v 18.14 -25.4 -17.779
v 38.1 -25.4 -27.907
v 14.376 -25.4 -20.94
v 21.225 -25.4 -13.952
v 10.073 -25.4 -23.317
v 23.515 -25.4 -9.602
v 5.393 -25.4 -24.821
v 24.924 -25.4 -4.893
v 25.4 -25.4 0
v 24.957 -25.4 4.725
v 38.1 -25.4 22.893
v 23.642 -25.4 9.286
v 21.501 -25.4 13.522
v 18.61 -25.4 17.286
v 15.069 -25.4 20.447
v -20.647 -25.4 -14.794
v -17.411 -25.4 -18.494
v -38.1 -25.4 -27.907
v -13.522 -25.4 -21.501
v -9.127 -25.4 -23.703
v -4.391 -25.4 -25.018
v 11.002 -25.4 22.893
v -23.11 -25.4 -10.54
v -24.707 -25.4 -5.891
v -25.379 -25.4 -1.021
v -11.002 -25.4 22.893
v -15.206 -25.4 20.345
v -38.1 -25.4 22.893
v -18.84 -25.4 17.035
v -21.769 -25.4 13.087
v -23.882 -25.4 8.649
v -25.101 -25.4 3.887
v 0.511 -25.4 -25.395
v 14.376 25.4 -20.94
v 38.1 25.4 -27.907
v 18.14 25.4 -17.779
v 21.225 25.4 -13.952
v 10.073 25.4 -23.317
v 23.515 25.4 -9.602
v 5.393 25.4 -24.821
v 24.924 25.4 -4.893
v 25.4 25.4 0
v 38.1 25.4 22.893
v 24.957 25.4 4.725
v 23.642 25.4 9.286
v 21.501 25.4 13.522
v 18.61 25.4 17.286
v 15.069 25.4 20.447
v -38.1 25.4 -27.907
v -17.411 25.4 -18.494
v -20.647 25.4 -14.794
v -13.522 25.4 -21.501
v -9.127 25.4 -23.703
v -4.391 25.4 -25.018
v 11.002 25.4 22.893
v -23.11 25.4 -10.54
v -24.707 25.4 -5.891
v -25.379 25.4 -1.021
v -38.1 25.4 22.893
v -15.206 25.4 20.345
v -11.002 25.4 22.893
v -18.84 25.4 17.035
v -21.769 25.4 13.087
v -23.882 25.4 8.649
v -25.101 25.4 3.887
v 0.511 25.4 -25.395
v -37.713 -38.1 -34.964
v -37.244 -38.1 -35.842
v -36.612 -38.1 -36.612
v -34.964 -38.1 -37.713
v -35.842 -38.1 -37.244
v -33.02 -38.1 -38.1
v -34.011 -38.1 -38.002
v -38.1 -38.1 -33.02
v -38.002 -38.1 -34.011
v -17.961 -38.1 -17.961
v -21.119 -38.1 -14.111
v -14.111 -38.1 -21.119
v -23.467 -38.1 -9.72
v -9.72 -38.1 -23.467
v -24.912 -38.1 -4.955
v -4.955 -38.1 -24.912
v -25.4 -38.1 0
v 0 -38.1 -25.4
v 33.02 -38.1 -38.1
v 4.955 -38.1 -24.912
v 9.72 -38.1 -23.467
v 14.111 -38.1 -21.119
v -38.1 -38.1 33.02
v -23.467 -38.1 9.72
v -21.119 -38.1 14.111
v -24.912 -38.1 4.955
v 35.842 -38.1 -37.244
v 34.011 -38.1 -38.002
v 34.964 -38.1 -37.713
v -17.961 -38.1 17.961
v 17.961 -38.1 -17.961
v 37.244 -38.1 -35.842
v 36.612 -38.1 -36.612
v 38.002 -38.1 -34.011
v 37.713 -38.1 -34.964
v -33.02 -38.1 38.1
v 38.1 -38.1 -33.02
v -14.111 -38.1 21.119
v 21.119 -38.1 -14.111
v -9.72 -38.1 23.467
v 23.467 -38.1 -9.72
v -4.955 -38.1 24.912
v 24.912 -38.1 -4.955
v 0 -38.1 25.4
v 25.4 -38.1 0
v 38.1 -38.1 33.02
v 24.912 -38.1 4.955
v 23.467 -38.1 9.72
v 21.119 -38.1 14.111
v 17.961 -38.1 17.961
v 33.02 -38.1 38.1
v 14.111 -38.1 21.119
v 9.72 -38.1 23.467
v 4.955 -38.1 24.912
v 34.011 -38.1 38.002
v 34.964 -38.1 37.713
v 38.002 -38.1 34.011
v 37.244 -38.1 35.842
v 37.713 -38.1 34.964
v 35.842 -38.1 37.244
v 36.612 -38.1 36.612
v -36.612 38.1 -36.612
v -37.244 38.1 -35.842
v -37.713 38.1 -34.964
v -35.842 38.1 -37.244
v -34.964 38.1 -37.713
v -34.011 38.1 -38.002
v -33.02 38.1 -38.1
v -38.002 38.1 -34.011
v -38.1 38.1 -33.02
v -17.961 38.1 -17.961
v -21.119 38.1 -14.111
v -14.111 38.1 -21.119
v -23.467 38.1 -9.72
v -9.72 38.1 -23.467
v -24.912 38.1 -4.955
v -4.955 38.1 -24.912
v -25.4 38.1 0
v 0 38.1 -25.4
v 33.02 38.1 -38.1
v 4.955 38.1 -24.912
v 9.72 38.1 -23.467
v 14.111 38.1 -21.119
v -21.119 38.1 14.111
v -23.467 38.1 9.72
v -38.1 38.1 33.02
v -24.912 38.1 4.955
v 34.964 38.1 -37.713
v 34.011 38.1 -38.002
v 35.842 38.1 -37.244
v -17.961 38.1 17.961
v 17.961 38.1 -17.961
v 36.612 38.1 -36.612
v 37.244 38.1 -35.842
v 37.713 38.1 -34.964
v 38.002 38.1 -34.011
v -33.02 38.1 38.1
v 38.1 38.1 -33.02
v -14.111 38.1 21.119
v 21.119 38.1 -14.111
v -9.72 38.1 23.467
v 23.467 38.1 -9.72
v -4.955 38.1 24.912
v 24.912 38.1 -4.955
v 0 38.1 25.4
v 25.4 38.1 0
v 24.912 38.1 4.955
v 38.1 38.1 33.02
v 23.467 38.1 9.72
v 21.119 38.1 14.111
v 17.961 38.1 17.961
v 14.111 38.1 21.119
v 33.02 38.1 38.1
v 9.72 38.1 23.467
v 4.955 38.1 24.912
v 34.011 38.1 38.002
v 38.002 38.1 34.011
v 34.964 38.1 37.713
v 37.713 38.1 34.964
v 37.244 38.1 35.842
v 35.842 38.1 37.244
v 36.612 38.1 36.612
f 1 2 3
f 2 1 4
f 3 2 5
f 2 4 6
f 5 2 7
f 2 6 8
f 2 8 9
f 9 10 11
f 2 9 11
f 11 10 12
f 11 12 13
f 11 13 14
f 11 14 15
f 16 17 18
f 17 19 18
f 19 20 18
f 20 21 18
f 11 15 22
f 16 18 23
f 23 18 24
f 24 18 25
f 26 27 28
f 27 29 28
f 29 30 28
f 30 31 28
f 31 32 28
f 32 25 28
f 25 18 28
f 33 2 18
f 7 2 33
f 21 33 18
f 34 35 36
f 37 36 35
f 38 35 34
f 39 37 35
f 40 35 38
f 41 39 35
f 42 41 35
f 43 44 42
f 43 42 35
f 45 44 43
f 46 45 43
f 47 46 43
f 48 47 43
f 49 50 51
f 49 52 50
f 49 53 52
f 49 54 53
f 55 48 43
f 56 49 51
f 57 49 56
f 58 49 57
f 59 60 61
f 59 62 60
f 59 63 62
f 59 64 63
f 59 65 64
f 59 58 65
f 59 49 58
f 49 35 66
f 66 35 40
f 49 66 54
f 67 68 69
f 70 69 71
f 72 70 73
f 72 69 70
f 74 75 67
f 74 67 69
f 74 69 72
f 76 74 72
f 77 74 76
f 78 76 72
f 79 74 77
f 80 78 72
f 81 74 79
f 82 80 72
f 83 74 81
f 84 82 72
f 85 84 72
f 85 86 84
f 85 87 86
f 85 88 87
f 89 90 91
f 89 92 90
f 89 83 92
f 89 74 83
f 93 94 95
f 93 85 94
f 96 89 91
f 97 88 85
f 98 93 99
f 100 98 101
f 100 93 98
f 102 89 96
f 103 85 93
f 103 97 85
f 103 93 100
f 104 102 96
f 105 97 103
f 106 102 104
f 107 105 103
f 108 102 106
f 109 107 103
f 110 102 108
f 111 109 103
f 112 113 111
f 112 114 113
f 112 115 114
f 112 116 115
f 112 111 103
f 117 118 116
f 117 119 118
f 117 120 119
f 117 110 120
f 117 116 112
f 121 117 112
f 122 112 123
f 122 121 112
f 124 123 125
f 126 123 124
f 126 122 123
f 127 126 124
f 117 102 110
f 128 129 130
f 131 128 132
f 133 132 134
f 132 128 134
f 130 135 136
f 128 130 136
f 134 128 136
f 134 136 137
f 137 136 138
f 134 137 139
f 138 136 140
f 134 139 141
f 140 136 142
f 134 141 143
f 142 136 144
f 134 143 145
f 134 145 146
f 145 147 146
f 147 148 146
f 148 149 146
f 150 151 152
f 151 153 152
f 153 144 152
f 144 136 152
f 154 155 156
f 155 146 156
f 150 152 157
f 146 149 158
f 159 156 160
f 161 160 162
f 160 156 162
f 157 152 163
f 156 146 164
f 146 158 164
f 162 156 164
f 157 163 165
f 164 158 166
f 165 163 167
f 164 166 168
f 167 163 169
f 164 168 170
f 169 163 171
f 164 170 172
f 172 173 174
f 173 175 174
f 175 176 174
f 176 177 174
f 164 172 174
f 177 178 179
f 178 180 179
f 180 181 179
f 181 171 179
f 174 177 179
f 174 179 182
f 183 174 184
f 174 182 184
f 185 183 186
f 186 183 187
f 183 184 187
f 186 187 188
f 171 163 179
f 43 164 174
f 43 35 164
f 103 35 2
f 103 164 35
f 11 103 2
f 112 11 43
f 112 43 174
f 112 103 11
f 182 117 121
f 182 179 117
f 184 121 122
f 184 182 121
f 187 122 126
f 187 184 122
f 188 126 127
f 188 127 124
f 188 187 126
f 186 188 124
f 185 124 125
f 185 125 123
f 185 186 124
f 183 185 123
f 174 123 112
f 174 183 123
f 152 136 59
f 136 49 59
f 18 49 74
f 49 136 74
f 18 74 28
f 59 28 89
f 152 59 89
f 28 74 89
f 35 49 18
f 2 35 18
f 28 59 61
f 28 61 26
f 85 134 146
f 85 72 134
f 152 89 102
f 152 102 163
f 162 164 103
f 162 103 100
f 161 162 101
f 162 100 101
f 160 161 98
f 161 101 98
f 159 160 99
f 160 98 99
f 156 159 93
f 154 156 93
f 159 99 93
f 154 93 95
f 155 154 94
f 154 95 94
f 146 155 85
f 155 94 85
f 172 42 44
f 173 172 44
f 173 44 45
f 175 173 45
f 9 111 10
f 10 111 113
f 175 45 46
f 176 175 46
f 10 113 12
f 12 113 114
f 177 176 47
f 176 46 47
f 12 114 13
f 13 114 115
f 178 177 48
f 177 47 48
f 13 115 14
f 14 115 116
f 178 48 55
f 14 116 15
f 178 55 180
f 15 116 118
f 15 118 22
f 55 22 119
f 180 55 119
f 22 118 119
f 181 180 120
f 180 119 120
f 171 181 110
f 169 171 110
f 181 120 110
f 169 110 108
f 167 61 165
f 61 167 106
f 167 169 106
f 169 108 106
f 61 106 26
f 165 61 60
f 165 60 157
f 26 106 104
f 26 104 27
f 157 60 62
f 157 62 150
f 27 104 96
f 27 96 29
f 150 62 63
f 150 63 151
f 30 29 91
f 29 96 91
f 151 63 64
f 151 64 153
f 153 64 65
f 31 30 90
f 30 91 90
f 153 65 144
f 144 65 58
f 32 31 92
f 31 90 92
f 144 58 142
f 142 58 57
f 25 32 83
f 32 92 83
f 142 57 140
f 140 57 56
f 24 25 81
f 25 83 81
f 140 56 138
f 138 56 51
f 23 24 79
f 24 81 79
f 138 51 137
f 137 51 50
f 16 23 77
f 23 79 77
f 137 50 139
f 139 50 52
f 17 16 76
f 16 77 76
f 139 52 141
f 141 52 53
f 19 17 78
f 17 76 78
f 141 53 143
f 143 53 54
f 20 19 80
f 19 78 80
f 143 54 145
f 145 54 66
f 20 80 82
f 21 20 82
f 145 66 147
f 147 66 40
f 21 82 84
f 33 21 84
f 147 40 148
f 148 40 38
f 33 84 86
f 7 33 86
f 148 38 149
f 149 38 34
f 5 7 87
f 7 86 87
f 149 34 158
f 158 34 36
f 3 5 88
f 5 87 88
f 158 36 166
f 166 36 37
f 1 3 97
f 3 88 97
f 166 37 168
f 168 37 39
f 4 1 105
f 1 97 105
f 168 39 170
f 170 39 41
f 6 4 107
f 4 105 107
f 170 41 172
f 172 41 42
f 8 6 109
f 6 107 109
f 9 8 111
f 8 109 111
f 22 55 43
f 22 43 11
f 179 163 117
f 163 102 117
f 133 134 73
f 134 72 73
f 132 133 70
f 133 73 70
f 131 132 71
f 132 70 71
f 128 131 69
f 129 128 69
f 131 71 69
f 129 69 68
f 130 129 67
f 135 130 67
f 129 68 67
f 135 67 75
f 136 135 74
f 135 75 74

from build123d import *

# Parameters (mm, degrees)
F0_W     = 76.2
F0_H     = 76.2
F1_DEPTH = 38.1
F2_R     = 25.4
F3_DEPTH = 76.2
F4_R     = 5.08
F5_SIZE  = 5.08
F6_R     = 5.08
F7_R     = 5.08
F8_W     = 50.8
F8_H     = 50.8
F9_DEPTH = 76.2


with BuildPart() as f1:
    # F0 (on Front) → F1 (new body, symmetric)
    with BuildSketch(Plane.XZ):
        Rectangle(F0_W, F0_H)
    extrude(amount=F1_DEPTH, both=True)

    # F2 (on face) → F3 (cut)
    with BuildSketch(Plane.XZ.offset(38.1)):
        Circle(F2_R)
    extrude(amount=-F3_DEPTH, mode=Mode.SUBTRACT)

    # F4
    f4_edges = [f1.edges().sort_by_distance(p)[0] for p in [
        (38.1, 0, 38.1),
    ]]
    fillet(f4_edges, radius=F4_R)

    # F5
    f5_edges = [f1.edges().sort_by_distance(p)[0] for p in [
        (-38.1, 0, 38.1),
    ]]
    chamfer(f5_edges, length=F5_SIZE)

    # F6
    f6_edges = [f1.edges().sort_by_distance(p)[0] for p in [
        (38.1, 0, -38.1),
    ]]
    fillet(f6_edges, radius=F6_R)

    # F7
    f7_edges = [f1.edges().sort_by_distance(p)[0] for p in [
        (-38.1, 0, -38.1),
    ]]
    fillet(f7_edges, radius=F7_R)

    # F8 (on face) → F9 (cut)
    with BuildSketch(Plane(origin=(-38.1, 0, 0), x_dir=(0, -1, 0), z_dir=(-1, 0, 0))):
        with Locations((0, -2.506579)):
            Rectangle(F8_W, F8_H)
    extrude(amount=-F9_DEPTH, mode=Mode.SUBTRACT)


solid = f1.part
